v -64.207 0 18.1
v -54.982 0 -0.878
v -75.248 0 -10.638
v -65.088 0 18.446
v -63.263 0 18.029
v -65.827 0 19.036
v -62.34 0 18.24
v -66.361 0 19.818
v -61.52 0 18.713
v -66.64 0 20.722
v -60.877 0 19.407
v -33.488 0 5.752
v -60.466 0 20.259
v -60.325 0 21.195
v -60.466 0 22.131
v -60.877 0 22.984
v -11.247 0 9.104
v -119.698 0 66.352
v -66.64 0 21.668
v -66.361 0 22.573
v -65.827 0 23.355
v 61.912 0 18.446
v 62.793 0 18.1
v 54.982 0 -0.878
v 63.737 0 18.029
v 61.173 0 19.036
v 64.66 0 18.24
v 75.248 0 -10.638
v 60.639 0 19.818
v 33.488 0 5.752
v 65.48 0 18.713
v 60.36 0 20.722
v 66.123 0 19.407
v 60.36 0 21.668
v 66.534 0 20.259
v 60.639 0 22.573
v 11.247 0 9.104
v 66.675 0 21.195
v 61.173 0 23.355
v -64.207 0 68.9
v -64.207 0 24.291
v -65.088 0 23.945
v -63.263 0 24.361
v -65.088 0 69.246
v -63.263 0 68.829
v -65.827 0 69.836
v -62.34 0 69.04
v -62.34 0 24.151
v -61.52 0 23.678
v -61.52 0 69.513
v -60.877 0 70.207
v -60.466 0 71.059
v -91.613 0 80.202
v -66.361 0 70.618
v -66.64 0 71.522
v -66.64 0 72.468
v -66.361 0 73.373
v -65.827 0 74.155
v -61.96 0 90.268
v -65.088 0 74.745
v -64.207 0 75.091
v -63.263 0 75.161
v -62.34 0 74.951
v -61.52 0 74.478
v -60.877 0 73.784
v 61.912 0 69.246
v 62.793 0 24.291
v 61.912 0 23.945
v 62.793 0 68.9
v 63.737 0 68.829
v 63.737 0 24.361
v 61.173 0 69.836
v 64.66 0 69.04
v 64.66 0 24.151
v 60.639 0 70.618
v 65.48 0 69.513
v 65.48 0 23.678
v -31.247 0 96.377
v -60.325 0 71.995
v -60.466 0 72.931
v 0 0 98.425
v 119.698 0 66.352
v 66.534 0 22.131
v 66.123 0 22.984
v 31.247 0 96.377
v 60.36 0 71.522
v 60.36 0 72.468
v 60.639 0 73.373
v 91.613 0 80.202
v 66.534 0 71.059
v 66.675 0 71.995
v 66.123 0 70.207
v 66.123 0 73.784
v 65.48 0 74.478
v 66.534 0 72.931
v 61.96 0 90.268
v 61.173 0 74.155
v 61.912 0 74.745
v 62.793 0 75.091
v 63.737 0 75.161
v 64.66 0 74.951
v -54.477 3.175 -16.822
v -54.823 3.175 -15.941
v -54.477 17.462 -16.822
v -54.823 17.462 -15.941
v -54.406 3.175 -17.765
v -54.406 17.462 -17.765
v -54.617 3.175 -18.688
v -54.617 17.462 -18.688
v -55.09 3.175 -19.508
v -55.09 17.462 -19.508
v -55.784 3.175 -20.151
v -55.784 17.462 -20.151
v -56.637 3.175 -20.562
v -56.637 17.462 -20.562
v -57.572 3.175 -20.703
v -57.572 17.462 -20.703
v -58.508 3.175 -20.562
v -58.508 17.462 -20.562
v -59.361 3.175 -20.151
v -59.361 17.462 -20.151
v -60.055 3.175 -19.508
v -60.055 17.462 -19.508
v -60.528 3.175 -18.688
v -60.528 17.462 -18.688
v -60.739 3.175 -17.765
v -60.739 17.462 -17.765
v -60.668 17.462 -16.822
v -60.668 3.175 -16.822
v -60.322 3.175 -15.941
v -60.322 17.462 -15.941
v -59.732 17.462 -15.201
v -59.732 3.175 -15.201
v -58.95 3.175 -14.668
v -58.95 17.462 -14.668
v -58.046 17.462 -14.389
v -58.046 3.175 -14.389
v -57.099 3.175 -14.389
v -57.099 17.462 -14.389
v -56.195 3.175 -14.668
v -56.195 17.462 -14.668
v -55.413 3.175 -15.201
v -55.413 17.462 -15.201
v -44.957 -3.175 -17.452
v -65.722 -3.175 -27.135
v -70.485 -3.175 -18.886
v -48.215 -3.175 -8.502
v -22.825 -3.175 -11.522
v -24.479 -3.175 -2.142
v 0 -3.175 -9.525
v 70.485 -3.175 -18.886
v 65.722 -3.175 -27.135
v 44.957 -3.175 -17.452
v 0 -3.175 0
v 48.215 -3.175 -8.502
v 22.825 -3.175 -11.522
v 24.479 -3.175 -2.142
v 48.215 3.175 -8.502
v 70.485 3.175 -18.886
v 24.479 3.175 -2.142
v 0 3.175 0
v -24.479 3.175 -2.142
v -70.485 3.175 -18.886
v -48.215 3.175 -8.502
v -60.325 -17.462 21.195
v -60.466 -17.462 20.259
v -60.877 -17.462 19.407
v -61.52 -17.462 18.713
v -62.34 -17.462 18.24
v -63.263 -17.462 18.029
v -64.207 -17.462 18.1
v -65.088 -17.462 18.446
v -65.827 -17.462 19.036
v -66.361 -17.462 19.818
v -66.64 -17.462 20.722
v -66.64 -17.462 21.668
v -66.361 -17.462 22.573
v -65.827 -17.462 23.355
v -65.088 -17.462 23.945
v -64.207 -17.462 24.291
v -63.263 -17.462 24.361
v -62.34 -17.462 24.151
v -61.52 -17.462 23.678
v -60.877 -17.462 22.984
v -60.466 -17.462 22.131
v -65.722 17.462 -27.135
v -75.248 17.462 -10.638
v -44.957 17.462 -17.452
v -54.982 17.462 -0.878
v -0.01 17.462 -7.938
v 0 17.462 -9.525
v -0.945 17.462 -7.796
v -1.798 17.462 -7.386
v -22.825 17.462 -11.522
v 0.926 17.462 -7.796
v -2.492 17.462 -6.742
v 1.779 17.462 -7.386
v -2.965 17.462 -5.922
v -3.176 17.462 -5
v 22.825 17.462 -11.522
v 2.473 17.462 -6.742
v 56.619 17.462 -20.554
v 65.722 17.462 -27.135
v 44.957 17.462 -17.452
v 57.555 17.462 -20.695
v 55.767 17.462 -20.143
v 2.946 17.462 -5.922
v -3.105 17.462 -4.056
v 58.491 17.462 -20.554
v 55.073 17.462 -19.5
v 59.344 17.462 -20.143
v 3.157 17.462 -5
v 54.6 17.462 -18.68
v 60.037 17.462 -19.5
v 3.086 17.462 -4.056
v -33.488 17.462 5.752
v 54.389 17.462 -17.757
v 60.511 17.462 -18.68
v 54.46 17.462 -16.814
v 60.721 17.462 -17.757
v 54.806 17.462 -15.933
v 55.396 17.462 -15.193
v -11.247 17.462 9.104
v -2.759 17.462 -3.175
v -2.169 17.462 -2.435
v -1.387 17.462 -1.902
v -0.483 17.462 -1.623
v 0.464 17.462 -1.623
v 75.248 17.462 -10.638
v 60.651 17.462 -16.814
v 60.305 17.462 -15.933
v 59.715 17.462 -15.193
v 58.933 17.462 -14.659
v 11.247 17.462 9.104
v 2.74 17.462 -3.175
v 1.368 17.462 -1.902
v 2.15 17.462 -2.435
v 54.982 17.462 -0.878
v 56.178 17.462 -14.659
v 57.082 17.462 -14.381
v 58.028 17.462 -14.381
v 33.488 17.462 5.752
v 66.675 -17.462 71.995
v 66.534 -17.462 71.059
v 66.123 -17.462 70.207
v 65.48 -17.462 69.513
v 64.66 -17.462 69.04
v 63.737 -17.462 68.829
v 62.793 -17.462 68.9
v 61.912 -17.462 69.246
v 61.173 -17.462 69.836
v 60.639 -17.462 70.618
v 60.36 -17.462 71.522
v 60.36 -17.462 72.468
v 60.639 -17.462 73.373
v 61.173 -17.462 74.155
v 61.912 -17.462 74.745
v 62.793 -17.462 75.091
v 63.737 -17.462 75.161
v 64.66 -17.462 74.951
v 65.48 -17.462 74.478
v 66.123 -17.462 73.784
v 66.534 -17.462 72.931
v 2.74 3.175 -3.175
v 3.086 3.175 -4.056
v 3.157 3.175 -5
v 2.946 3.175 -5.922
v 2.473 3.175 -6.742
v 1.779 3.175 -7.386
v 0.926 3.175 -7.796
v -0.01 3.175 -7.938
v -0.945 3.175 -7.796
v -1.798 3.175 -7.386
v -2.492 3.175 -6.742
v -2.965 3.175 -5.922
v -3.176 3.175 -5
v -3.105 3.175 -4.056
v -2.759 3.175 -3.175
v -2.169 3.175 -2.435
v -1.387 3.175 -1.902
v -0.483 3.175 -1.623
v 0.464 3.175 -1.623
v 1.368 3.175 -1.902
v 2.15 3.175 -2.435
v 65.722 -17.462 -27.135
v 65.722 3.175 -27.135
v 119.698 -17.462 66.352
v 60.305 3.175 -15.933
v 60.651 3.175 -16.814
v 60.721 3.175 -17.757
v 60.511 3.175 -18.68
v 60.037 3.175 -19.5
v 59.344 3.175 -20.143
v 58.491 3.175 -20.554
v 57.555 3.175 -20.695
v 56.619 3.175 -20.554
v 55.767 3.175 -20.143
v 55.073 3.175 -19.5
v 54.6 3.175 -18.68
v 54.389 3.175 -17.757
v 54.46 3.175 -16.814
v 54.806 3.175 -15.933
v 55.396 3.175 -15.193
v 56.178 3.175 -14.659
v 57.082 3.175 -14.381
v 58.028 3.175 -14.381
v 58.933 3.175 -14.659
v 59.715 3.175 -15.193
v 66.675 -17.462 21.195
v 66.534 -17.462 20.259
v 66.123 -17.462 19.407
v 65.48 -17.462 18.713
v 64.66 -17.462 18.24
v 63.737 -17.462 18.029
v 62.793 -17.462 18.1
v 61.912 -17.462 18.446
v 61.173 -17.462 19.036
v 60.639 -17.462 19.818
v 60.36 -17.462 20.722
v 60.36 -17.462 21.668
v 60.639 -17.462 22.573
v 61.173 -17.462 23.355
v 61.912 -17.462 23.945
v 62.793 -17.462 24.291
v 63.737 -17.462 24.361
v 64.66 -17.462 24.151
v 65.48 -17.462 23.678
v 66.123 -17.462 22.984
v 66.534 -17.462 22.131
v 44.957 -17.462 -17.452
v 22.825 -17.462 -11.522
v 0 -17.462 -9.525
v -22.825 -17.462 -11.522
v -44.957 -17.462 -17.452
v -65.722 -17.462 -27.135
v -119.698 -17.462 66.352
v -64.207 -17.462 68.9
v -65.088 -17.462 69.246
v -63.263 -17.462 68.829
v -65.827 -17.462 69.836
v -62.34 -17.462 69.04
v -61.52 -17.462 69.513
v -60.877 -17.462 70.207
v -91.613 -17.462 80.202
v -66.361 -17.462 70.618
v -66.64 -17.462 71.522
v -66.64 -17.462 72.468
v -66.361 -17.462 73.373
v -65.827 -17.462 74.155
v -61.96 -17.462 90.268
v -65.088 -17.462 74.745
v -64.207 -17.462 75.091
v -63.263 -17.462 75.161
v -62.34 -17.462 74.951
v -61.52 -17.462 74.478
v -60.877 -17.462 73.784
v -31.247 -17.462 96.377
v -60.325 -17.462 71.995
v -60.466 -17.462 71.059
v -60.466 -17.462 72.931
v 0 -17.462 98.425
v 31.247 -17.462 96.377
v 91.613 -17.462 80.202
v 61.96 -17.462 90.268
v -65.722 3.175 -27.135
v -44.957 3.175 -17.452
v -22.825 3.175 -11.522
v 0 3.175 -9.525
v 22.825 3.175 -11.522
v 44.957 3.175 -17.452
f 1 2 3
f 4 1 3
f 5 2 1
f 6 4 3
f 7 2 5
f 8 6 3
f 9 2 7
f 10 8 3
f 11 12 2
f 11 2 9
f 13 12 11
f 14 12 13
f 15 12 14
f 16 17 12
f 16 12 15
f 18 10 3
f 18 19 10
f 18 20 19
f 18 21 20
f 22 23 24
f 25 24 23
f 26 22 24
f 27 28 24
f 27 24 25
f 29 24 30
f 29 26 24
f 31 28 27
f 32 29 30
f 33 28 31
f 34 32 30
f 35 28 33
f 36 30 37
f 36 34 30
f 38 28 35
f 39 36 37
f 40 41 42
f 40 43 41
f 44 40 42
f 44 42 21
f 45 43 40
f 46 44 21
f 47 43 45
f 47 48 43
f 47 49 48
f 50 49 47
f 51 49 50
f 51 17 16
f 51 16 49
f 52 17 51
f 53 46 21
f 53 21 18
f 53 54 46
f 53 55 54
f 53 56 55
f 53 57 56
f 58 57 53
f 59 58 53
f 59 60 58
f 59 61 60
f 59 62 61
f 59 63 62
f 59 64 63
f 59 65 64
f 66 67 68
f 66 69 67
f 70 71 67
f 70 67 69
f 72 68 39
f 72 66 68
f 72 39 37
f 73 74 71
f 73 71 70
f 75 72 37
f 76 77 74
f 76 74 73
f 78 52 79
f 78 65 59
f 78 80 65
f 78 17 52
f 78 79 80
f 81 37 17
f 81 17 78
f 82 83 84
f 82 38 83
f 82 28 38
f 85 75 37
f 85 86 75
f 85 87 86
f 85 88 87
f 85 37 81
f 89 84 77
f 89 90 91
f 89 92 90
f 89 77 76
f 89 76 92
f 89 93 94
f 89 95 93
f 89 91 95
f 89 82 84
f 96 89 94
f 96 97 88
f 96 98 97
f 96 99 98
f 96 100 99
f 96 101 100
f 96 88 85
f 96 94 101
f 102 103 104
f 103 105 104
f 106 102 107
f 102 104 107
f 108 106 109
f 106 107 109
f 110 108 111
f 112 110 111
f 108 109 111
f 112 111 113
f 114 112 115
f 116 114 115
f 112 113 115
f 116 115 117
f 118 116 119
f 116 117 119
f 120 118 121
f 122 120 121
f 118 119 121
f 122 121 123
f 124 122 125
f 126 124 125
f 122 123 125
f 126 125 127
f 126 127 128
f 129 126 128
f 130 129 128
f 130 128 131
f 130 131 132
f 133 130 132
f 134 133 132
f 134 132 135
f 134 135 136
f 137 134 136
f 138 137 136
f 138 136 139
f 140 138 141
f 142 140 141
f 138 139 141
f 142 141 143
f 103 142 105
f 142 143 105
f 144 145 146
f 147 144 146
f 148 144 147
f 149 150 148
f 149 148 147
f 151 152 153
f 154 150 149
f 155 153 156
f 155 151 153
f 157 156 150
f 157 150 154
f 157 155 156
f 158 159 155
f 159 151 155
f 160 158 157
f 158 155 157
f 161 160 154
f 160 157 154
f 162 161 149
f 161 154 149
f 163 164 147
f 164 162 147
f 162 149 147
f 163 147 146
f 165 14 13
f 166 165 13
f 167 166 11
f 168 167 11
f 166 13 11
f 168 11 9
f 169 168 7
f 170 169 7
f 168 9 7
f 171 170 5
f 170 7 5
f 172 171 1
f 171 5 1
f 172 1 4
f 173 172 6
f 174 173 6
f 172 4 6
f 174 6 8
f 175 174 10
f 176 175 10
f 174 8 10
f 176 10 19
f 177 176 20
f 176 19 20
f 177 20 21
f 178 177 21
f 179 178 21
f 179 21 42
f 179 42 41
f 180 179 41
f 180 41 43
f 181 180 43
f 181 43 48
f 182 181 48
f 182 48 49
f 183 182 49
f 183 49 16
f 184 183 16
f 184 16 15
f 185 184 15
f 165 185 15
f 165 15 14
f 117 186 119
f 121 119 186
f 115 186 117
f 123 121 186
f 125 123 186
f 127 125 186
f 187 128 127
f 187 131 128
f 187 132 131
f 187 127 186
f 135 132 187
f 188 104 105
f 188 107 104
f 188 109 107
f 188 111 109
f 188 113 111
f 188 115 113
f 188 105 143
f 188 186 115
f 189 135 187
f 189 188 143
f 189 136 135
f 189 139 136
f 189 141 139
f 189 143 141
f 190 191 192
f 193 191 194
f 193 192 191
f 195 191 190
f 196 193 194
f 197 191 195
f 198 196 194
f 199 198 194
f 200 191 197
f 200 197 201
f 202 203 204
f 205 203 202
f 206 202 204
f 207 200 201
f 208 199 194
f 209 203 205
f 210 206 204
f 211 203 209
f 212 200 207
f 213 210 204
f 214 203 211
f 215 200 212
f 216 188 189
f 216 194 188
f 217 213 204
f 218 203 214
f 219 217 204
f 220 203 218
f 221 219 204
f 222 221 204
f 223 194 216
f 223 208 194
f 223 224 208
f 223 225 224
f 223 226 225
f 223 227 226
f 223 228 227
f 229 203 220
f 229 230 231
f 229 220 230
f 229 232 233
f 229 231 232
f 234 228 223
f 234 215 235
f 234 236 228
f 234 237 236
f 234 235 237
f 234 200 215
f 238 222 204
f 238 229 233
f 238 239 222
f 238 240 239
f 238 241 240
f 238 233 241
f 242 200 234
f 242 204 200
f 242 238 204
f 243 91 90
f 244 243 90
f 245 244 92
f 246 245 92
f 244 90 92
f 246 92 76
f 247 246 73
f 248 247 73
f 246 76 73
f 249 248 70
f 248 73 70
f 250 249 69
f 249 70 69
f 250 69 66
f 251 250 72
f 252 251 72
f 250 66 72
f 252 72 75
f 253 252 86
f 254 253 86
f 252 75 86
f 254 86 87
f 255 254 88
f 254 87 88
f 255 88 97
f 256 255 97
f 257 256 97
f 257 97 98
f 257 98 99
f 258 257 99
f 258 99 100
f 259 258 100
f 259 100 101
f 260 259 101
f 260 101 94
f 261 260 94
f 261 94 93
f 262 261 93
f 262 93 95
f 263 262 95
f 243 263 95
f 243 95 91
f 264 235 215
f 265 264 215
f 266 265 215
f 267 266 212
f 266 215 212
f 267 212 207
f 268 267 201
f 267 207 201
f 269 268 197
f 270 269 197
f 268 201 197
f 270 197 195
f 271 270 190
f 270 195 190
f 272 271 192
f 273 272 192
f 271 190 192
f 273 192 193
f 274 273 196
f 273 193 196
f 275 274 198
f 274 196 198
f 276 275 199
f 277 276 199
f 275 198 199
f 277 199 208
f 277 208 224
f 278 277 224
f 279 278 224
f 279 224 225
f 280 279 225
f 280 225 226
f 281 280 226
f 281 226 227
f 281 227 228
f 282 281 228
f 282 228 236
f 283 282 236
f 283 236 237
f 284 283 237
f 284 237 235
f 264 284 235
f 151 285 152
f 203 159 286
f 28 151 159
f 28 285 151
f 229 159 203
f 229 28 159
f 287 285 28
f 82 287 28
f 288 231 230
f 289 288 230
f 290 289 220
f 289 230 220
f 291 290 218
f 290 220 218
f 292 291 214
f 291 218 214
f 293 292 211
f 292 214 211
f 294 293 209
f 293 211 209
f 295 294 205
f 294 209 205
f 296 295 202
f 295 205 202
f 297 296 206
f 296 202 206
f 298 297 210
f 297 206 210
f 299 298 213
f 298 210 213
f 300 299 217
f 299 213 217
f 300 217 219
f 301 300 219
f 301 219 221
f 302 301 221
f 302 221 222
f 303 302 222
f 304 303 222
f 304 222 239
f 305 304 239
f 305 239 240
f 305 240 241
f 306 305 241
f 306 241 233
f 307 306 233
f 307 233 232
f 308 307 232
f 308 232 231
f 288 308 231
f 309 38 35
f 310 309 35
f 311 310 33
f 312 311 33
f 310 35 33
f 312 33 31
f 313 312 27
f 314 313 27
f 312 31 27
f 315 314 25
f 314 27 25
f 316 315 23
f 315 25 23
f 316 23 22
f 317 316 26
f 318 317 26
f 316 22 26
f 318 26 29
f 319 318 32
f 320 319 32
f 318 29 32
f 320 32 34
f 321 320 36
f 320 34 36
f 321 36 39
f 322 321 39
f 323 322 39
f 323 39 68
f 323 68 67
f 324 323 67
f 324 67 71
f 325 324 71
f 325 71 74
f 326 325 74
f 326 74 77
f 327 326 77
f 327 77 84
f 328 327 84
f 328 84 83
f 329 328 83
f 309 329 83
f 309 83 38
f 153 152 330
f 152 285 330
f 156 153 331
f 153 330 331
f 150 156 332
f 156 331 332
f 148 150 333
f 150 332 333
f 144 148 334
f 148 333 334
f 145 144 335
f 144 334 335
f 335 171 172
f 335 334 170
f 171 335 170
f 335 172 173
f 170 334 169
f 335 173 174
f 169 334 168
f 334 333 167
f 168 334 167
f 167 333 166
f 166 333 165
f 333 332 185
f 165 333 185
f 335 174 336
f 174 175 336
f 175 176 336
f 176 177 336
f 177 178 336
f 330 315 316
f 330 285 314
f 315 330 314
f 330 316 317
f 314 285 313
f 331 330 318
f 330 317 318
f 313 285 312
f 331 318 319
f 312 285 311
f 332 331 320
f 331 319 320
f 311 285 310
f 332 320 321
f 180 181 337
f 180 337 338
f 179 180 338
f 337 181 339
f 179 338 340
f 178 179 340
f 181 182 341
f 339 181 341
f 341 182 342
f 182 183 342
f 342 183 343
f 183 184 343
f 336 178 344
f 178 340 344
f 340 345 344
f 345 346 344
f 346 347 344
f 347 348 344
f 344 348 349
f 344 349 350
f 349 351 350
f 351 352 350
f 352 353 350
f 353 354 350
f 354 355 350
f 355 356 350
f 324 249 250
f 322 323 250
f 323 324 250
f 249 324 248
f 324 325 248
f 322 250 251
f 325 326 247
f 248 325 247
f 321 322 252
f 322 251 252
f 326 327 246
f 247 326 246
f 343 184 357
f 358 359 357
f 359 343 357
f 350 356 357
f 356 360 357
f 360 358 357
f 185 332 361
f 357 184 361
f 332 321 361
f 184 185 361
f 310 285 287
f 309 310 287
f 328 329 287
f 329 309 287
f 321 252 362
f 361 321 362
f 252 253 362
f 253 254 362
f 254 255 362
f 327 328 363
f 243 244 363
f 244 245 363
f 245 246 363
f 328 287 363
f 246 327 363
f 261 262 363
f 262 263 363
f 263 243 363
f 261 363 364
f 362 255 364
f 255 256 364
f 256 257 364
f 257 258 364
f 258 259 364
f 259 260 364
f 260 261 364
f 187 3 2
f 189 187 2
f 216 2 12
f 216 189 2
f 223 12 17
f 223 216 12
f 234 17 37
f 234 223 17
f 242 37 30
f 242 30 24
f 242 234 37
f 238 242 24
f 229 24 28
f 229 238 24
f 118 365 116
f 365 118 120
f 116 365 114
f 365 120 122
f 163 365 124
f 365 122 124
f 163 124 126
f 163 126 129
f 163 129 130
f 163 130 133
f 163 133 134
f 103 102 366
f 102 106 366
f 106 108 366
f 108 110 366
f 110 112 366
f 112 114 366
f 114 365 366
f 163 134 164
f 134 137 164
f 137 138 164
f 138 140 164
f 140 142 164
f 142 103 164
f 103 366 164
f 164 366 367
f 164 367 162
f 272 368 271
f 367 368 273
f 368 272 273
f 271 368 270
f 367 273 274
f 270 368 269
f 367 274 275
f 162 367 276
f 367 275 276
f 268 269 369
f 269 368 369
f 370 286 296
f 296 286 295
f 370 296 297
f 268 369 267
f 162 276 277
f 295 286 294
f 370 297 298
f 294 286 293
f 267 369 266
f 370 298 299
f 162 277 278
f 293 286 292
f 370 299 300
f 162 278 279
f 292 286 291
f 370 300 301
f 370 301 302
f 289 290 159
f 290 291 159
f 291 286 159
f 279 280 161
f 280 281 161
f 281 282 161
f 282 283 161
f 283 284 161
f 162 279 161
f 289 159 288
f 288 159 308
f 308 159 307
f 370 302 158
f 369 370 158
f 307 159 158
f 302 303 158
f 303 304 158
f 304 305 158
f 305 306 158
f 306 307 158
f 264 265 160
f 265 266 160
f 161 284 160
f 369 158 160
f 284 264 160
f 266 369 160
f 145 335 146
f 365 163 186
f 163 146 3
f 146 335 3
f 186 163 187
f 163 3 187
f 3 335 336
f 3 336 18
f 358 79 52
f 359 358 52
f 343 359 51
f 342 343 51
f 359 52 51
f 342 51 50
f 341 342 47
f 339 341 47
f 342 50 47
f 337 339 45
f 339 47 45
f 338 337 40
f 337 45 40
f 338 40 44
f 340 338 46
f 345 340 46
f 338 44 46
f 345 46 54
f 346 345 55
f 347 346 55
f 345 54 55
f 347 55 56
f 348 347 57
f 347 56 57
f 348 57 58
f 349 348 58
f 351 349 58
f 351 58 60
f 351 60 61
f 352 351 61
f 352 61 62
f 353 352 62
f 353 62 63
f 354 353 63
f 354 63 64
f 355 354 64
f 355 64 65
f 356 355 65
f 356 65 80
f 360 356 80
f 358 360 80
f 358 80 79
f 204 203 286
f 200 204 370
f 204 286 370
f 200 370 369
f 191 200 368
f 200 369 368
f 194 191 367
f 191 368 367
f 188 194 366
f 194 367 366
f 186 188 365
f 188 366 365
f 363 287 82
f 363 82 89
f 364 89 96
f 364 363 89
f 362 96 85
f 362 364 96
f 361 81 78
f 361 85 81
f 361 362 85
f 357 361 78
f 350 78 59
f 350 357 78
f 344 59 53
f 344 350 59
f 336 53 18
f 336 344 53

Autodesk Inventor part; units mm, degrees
ref_plane "YZ Plane" through (0, 0, 0) normal (1, 0, 0) x (0, 1, 0)
ref_plane "XZ Plane" through (0, 0, 0) normal (0, 1, 0) x (-1, 0, 0)
ref_plane "XY Plane" through (0, 0, 0) normal (0, 0, 1) x (1, 0, 0)
sketch "Sketch1" plane through (0, 0, 0) normal (1, 0, 0) x (0, 1, 0)
  line L0 (-17.4625, 9.525) -> (17.4625, 9.525)
  line L1 (17.4625, 9.525) -> (17.4625, -9.525)
  line L2 (17.4625, -9.525) -> (-17.4625, -9.525)
  line L3 (-17.4625, -9.525) -> (-17.4625, 9.525)
  line L4 (-17.4625, 9.525) -> (17.4625, -9.525) construction
  line L5 (17.4625, 9.525) -> (-17.4625, -9.525) construction
  line L6 (3.175, -9.525) -> (3.175, 0)
  line L7 (3.175, 0) -> (-3.175, 0)
  line L8 (-3.175, 0) -> (-3.175, -9.525)
  line L9 (-17.4625, 9.525) -> (0, 9.525)
  line L10 (0, 9.525) -> (0, 98.425)
  line L11 (0, 98.425) -> (-17.4625, 98.425)
  line L12 (-17.4625, 98.425) -> (-17.4625, 9.525)
  line L13 (0, -9.525) -> (-0.0003, -140.97) construction
  line L14 (-0.0003, -140.97) -> (69.3079, -140.97)
  point P0 (0, 0)
  point P1 (0, 0)
  dimension "d0" = 6.35
  dimension "d1" = 9.525
  dimension "d2" = 9.525
  dimension "d3" = 19.05
  dimension "d4" = 34.925
  dimension "d5" = 0
  dimension "d6" = 88.9
  dimension "d7" = 131.445
revolve "Revolution1" add sketch "Sketch1" angle 60 mid plane about axis through (0, -0.0003, -140.97) along (0, 1, 0) contours L12 L11 L10 L0 | L0 L1 L2 L6 L7 L8 L3
sketch "Sketch2" plane through (-75.2475, 17.4625, -10.6375) normal (0, 1, 0) x (0.866, 0, 0.5)
  arc A0 (70.485, 28.4114) -> (122.0836, 80.01) centre (0, 150.495) ccw projected
  arc A1 (0, 19.05) -> (113.8347, 84.7725) centre (0, 150.495) ccw projected
  line L0 (0, 19.05) -> (0, 0) construction
  line L1 (113.8347, 84.7725) -> (122.0836, 80.01) construction
  arc A2 (89.2238, 47.5795) -> (117.9592, 82.3912) centre (0, 150.495) ccw construction
  circle A3 centre (11.8618, 14.805) radius 3.175
  circle A4 centre (68.0955, 32.5311) radius 3.175
  circle A5 centre (111.5692, 72.3618) radius 3.175
  point P0 (0, 0)
  dimension "d22" = 140.97
  dimension "d23" = 136.2075
  dimension "d24" = 6.35
  dimension "d25" = 11.8618
  dimension "d34" = 50
extrude "Extrusion2" cut sketch "Sketch2" against normal up to surface (14.2875 mm away)
sketch "Sketch3" plane through (0, 0, -140.97) normal (0, 1, 0) x (1, 0, 0)
  line L0 (-63.5, -212.9652) -> (63.5, -212.9652) construction
  line L1 (63.5, -212.9652) -> (63.5, -162.1652) construction
  line L2 (63.5, -162.1652) -> (-63.5, -162.1652) construction
  line L3 (-63.5, -162.1652) -> (-63.5, -212.9652) construction
  line L4 (-63.5, -212.9652) -> (63.5, -162.1652) construction
  line L5 (63.5, -212.9652) -> (-63.5, -162.1652) construction
  line L6 (-75.2475, -130.3325) -> (-119.6975, -207.3222) projected
  line L7 (75.2475, -130.3325) -> (119.6975, -207.3222) projected
  arc A0 (-97.4725, -168.8273) -> (97.4725, -168.8273) centre (0, 75.3248) ccw construction
  circle A1 centre (63.5, -162.1652) radius 3.175
  circle A2 centre (-63.5, -162.1652) radius 3.175
  circle A3 centre (63.5, -212.9652) radius 3.175
  circle A4 centre (-63.5, -212.9652) radius 3.175
  point P0 (0, -140.97)
  point P1 (0, -187.5652)
  dimension "d37" = 50.8
  dimension "d38" = 127
  dimension "d39" = 262.89
  dimension "d41" = 6.35
  dimension "d44" = 127
  dimension "d47" = 50.8
extrude "Extrusion3" cut sketch "Sketch3" against normal through all
equation "\"d2\" = d1"
equation "\"d3\" = 2 * d1"
properties part number "shelf_attachment" material "Aluminum 6061"
